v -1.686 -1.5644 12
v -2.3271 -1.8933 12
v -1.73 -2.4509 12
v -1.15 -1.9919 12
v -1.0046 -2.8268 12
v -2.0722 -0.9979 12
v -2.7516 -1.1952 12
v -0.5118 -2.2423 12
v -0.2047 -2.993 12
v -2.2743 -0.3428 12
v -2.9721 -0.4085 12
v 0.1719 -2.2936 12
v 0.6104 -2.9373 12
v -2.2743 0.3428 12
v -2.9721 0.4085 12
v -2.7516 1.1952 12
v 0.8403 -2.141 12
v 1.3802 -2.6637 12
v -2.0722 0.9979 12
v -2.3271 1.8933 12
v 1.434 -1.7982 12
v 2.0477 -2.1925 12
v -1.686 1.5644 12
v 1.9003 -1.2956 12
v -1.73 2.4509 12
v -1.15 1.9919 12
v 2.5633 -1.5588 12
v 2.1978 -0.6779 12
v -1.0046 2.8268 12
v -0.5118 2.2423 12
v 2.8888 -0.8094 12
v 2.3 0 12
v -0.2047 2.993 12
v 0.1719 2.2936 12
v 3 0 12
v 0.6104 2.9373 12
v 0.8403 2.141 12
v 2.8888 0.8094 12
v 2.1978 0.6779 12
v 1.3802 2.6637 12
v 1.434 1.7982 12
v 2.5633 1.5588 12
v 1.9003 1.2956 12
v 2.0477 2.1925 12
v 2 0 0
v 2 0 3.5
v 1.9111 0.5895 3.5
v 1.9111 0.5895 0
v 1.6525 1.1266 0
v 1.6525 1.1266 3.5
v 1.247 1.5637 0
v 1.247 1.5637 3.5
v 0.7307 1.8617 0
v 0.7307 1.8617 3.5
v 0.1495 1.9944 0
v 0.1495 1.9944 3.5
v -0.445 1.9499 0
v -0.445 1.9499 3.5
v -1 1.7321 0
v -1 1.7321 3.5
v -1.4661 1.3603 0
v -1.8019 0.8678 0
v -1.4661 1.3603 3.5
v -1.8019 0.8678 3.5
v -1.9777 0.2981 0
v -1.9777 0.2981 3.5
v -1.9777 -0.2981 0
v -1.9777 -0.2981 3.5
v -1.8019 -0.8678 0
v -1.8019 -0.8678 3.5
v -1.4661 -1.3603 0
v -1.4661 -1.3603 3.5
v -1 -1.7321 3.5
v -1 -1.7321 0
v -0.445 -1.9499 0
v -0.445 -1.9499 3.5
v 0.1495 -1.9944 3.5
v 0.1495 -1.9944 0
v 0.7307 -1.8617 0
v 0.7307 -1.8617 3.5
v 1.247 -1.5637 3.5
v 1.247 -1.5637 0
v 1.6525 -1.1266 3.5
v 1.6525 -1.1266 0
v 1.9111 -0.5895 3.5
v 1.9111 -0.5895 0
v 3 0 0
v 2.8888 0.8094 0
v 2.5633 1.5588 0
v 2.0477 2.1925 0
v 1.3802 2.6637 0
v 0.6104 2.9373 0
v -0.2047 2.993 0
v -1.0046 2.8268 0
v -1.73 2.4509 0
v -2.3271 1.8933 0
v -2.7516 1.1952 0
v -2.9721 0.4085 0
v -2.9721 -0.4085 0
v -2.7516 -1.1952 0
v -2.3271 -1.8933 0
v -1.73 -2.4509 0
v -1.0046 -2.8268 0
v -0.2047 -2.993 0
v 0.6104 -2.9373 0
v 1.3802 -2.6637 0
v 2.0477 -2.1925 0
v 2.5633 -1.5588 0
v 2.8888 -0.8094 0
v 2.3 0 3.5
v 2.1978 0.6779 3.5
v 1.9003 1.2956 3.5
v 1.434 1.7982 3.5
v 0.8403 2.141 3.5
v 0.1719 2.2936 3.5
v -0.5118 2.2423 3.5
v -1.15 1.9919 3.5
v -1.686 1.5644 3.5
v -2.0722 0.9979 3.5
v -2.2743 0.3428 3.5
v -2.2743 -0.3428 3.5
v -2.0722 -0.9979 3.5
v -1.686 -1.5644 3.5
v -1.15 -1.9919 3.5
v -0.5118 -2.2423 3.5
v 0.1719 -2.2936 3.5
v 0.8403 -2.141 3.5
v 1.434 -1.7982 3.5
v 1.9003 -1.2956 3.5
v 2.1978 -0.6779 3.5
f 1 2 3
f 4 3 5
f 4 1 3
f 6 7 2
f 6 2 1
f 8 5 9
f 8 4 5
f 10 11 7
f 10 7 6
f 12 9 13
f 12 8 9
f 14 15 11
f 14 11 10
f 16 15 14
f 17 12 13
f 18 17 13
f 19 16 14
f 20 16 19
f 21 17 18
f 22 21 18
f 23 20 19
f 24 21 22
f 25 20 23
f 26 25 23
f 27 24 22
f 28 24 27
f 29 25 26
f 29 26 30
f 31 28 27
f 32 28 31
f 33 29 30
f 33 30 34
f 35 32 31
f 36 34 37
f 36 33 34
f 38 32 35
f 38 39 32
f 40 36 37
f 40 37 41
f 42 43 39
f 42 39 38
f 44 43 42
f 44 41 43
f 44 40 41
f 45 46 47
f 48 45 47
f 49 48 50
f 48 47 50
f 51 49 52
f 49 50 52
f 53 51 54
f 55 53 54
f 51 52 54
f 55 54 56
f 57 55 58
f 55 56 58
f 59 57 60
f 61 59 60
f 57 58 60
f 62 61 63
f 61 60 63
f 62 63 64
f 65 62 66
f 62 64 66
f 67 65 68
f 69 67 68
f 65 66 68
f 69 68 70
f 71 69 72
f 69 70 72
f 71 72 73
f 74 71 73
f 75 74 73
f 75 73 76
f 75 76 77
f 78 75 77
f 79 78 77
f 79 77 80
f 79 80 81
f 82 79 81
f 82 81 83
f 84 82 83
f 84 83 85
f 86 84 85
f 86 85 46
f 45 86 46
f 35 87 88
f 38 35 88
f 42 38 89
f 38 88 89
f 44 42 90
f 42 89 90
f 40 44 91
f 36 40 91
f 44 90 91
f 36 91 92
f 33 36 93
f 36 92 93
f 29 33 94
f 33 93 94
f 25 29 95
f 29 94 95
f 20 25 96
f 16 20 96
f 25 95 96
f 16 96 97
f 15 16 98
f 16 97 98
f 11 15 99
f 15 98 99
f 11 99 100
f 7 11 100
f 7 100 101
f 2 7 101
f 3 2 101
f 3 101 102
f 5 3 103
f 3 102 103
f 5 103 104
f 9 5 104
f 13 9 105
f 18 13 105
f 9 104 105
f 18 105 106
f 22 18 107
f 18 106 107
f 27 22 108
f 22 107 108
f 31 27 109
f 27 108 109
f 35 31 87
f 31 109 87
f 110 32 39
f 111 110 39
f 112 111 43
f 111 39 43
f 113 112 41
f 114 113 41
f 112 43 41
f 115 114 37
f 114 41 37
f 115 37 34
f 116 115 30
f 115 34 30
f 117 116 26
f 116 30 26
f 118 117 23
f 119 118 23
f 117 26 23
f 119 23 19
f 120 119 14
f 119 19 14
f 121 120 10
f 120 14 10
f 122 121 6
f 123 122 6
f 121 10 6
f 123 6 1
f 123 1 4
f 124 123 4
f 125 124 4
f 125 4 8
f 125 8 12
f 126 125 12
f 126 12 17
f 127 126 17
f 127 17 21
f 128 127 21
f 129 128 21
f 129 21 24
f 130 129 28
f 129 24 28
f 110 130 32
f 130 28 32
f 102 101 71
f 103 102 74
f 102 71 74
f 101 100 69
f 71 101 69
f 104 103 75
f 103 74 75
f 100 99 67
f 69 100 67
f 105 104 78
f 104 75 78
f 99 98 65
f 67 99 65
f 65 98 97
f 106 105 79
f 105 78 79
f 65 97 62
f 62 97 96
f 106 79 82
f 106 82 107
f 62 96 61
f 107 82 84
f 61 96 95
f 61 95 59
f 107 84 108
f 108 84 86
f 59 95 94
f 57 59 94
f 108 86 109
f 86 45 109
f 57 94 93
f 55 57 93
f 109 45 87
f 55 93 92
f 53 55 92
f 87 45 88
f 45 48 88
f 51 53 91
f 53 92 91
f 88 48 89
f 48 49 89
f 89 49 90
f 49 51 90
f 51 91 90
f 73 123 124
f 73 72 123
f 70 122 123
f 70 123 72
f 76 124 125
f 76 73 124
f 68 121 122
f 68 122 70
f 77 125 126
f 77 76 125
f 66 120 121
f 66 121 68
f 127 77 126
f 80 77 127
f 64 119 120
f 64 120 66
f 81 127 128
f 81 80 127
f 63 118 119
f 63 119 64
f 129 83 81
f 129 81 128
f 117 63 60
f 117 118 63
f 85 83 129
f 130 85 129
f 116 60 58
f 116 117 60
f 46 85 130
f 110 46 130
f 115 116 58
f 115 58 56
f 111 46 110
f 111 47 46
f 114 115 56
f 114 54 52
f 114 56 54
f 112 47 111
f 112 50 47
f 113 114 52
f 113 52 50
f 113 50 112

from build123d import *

# Parameters (mm, degrees)
ESBO_O1_R                = 3
RESSALTO_EXTRUS_O1_DEPTH = 12
ESBO_O2_R                = 2.3
CORTE_EXTRUS_O1_DEPTH    = 8.5
CORTE_EXTRUS_O2_REACH    = 11.5
ESBO_O3_R                = 2


with BuildPart() as part:
    # Esboço1 → Ressalto-extrusão1 (new body)
    with BuildSketch(Plane.XY):
        Circle(ESBO_O1_R)
    extrude(amount=RESSALTO_EXTRUS_O1_DEPTH)

    # Esboço2 → Corte-extrusão1 (cut)
    with BuildSketch(Plane.XY.offset(12)):
        Circle(ESBO_O2_R)
    extrude(amount=-CORTE_EXTRUS_O1_DEPTH, mode=Mode.SUBTRACT)

    # Esboço3 → Corte-extrusão2 (cut, up to next)
    with BuildSketch(Plane.XY.offset(3.5), mode=Mode.PRIVATE) as corte_extrus_o2_sk1:
        Circle(ESBO_O3_R)
    corte_extrus_o2_tool1 = extrude(corte_extrus_o2_sk1.sketch, amount=-CORTE_EXTRUS_O2_REACH, mode=Mode.PRIVATE) & part.part
    add(corte_extrus_o2_tool1.solids().sort_by_distance((0, 0, 3.5))[0], mode=Mode.SUBTRACT)


solid = part.part
